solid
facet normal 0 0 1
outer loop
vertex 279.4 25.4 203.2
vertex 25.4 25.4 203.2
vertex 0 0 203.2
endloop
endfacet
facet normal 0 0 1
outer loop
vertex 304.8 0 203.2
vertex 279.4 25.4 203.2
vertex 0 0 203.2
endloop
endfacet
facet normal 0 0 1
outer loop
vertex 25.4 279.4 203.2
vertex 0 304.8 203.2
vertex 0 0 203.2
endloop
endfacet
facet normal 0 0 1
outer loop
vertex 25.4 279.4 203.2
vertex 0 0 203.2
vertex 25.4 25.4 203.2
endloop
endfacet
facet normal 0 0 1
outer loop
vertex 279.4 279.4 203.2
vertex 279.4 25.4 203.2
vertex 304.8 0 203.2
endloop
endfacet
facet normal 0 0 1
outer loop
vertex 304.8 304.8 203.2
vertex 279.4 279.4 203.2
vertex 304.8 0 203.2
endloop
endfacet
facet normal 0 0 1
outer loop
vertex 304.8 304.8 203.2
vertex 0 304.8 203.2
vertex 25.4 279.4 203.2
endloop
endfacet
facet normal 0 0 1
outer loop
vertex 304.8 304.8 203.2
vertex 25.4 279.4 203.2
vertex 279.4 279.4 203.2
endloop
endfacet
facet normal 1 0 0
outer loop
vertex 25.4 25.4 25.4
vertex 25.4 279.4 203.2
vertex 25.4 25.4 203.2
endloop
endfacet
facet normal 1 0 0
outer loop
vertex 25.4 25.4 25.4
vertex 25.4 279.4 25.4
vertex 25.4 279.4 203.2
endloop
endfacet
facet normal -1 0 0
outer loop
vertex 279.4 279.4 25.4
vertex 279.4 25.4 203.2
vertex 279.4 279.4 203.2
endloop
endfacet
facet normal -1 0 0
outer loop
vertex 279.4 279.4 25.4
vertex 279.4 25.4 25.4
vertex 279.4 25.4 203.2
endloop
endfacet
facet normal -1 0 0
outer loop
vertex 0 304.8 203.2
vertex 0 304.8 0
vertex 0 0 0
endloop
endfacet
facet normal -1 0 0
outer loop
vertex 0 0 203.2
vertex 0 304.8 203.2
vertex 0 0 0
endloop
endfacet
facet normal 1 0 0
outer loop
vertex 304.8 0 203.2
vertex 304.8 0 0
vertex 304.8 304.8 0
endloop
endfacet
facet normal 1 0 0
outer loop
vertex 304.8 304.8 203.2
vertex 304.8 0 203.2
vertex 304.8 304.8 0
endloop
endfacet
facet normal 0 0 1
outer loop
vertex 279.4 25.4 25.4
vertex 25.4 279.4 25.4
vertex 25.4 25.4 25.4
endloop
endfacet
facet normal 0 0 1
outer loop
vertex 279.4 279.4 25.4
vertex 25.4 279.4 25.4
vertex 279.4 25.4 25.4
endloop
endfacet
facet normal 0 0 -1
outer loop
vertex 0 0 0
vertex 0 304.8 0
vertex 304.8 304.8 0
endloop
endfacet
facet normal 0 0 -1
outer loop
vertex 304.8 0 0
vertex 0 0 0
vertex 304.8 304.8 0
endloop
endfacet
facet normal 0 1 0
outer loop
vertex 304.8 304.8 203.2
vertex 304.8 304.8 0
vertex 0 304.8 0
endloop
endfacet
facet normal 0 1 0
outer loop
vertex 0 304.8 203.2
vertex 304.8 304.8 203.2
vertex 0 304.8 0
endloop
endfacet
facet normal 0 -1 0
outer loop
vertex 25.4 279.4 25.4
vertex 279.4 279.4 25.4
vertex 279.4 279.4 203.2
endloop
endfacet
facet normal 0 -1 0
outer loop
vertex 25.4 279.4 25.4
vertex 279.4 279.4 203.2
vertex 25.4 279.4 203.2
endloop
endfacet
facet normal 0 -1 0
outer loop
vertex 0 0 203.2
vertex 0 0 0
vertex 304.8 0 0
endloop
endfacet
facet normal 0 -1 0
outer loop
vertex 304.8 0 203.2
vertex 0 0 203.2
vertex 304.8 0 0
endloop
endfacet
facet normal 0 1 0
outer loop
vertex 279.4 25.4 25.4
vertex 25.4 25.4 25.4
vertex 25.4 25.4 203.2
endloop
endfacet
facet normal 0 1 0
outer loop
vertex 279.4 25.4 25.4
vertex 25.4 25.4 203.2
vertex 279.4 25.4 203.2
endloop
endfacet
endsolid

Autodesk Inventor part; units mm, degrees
ref_plane "YZ Plane" through (0, 0, 0) normal (1, 0, 0) x (0, 1, 0)
ref_plane "XZ Plane" through (0, 0, 0) normal (0, 1, 0) x (-1, 0, 0)
ref_plane "XY Plane" through (0, 0, 0) normal (0, 0, 1) x (1, 0, 0)
sketch "Sketch1" plane through (0, 0, 0) normal (0, 0, 1) x (1, 0, 0)
  line L0 (0, 0) -> (304.8, 0)
  line L1 (304.8, 0) -> (304.8, 304.8)
  line L2 (304.8, 304.8) -> (0, 304.8)
  line L3 (0, 304.8) -> (0, 0)
  dimension "d0" = 304.8
  dimension "d1" = 304.8
extrude "Extrusion1" add sketch "Sketch1" along normal blind 203.2
shell "Shell1" thickness 25.4 removed faces 1 at (101.6, 203.2, 203.2)
equation "\"d1\" = d0"
properties part number "Yellow truck"
